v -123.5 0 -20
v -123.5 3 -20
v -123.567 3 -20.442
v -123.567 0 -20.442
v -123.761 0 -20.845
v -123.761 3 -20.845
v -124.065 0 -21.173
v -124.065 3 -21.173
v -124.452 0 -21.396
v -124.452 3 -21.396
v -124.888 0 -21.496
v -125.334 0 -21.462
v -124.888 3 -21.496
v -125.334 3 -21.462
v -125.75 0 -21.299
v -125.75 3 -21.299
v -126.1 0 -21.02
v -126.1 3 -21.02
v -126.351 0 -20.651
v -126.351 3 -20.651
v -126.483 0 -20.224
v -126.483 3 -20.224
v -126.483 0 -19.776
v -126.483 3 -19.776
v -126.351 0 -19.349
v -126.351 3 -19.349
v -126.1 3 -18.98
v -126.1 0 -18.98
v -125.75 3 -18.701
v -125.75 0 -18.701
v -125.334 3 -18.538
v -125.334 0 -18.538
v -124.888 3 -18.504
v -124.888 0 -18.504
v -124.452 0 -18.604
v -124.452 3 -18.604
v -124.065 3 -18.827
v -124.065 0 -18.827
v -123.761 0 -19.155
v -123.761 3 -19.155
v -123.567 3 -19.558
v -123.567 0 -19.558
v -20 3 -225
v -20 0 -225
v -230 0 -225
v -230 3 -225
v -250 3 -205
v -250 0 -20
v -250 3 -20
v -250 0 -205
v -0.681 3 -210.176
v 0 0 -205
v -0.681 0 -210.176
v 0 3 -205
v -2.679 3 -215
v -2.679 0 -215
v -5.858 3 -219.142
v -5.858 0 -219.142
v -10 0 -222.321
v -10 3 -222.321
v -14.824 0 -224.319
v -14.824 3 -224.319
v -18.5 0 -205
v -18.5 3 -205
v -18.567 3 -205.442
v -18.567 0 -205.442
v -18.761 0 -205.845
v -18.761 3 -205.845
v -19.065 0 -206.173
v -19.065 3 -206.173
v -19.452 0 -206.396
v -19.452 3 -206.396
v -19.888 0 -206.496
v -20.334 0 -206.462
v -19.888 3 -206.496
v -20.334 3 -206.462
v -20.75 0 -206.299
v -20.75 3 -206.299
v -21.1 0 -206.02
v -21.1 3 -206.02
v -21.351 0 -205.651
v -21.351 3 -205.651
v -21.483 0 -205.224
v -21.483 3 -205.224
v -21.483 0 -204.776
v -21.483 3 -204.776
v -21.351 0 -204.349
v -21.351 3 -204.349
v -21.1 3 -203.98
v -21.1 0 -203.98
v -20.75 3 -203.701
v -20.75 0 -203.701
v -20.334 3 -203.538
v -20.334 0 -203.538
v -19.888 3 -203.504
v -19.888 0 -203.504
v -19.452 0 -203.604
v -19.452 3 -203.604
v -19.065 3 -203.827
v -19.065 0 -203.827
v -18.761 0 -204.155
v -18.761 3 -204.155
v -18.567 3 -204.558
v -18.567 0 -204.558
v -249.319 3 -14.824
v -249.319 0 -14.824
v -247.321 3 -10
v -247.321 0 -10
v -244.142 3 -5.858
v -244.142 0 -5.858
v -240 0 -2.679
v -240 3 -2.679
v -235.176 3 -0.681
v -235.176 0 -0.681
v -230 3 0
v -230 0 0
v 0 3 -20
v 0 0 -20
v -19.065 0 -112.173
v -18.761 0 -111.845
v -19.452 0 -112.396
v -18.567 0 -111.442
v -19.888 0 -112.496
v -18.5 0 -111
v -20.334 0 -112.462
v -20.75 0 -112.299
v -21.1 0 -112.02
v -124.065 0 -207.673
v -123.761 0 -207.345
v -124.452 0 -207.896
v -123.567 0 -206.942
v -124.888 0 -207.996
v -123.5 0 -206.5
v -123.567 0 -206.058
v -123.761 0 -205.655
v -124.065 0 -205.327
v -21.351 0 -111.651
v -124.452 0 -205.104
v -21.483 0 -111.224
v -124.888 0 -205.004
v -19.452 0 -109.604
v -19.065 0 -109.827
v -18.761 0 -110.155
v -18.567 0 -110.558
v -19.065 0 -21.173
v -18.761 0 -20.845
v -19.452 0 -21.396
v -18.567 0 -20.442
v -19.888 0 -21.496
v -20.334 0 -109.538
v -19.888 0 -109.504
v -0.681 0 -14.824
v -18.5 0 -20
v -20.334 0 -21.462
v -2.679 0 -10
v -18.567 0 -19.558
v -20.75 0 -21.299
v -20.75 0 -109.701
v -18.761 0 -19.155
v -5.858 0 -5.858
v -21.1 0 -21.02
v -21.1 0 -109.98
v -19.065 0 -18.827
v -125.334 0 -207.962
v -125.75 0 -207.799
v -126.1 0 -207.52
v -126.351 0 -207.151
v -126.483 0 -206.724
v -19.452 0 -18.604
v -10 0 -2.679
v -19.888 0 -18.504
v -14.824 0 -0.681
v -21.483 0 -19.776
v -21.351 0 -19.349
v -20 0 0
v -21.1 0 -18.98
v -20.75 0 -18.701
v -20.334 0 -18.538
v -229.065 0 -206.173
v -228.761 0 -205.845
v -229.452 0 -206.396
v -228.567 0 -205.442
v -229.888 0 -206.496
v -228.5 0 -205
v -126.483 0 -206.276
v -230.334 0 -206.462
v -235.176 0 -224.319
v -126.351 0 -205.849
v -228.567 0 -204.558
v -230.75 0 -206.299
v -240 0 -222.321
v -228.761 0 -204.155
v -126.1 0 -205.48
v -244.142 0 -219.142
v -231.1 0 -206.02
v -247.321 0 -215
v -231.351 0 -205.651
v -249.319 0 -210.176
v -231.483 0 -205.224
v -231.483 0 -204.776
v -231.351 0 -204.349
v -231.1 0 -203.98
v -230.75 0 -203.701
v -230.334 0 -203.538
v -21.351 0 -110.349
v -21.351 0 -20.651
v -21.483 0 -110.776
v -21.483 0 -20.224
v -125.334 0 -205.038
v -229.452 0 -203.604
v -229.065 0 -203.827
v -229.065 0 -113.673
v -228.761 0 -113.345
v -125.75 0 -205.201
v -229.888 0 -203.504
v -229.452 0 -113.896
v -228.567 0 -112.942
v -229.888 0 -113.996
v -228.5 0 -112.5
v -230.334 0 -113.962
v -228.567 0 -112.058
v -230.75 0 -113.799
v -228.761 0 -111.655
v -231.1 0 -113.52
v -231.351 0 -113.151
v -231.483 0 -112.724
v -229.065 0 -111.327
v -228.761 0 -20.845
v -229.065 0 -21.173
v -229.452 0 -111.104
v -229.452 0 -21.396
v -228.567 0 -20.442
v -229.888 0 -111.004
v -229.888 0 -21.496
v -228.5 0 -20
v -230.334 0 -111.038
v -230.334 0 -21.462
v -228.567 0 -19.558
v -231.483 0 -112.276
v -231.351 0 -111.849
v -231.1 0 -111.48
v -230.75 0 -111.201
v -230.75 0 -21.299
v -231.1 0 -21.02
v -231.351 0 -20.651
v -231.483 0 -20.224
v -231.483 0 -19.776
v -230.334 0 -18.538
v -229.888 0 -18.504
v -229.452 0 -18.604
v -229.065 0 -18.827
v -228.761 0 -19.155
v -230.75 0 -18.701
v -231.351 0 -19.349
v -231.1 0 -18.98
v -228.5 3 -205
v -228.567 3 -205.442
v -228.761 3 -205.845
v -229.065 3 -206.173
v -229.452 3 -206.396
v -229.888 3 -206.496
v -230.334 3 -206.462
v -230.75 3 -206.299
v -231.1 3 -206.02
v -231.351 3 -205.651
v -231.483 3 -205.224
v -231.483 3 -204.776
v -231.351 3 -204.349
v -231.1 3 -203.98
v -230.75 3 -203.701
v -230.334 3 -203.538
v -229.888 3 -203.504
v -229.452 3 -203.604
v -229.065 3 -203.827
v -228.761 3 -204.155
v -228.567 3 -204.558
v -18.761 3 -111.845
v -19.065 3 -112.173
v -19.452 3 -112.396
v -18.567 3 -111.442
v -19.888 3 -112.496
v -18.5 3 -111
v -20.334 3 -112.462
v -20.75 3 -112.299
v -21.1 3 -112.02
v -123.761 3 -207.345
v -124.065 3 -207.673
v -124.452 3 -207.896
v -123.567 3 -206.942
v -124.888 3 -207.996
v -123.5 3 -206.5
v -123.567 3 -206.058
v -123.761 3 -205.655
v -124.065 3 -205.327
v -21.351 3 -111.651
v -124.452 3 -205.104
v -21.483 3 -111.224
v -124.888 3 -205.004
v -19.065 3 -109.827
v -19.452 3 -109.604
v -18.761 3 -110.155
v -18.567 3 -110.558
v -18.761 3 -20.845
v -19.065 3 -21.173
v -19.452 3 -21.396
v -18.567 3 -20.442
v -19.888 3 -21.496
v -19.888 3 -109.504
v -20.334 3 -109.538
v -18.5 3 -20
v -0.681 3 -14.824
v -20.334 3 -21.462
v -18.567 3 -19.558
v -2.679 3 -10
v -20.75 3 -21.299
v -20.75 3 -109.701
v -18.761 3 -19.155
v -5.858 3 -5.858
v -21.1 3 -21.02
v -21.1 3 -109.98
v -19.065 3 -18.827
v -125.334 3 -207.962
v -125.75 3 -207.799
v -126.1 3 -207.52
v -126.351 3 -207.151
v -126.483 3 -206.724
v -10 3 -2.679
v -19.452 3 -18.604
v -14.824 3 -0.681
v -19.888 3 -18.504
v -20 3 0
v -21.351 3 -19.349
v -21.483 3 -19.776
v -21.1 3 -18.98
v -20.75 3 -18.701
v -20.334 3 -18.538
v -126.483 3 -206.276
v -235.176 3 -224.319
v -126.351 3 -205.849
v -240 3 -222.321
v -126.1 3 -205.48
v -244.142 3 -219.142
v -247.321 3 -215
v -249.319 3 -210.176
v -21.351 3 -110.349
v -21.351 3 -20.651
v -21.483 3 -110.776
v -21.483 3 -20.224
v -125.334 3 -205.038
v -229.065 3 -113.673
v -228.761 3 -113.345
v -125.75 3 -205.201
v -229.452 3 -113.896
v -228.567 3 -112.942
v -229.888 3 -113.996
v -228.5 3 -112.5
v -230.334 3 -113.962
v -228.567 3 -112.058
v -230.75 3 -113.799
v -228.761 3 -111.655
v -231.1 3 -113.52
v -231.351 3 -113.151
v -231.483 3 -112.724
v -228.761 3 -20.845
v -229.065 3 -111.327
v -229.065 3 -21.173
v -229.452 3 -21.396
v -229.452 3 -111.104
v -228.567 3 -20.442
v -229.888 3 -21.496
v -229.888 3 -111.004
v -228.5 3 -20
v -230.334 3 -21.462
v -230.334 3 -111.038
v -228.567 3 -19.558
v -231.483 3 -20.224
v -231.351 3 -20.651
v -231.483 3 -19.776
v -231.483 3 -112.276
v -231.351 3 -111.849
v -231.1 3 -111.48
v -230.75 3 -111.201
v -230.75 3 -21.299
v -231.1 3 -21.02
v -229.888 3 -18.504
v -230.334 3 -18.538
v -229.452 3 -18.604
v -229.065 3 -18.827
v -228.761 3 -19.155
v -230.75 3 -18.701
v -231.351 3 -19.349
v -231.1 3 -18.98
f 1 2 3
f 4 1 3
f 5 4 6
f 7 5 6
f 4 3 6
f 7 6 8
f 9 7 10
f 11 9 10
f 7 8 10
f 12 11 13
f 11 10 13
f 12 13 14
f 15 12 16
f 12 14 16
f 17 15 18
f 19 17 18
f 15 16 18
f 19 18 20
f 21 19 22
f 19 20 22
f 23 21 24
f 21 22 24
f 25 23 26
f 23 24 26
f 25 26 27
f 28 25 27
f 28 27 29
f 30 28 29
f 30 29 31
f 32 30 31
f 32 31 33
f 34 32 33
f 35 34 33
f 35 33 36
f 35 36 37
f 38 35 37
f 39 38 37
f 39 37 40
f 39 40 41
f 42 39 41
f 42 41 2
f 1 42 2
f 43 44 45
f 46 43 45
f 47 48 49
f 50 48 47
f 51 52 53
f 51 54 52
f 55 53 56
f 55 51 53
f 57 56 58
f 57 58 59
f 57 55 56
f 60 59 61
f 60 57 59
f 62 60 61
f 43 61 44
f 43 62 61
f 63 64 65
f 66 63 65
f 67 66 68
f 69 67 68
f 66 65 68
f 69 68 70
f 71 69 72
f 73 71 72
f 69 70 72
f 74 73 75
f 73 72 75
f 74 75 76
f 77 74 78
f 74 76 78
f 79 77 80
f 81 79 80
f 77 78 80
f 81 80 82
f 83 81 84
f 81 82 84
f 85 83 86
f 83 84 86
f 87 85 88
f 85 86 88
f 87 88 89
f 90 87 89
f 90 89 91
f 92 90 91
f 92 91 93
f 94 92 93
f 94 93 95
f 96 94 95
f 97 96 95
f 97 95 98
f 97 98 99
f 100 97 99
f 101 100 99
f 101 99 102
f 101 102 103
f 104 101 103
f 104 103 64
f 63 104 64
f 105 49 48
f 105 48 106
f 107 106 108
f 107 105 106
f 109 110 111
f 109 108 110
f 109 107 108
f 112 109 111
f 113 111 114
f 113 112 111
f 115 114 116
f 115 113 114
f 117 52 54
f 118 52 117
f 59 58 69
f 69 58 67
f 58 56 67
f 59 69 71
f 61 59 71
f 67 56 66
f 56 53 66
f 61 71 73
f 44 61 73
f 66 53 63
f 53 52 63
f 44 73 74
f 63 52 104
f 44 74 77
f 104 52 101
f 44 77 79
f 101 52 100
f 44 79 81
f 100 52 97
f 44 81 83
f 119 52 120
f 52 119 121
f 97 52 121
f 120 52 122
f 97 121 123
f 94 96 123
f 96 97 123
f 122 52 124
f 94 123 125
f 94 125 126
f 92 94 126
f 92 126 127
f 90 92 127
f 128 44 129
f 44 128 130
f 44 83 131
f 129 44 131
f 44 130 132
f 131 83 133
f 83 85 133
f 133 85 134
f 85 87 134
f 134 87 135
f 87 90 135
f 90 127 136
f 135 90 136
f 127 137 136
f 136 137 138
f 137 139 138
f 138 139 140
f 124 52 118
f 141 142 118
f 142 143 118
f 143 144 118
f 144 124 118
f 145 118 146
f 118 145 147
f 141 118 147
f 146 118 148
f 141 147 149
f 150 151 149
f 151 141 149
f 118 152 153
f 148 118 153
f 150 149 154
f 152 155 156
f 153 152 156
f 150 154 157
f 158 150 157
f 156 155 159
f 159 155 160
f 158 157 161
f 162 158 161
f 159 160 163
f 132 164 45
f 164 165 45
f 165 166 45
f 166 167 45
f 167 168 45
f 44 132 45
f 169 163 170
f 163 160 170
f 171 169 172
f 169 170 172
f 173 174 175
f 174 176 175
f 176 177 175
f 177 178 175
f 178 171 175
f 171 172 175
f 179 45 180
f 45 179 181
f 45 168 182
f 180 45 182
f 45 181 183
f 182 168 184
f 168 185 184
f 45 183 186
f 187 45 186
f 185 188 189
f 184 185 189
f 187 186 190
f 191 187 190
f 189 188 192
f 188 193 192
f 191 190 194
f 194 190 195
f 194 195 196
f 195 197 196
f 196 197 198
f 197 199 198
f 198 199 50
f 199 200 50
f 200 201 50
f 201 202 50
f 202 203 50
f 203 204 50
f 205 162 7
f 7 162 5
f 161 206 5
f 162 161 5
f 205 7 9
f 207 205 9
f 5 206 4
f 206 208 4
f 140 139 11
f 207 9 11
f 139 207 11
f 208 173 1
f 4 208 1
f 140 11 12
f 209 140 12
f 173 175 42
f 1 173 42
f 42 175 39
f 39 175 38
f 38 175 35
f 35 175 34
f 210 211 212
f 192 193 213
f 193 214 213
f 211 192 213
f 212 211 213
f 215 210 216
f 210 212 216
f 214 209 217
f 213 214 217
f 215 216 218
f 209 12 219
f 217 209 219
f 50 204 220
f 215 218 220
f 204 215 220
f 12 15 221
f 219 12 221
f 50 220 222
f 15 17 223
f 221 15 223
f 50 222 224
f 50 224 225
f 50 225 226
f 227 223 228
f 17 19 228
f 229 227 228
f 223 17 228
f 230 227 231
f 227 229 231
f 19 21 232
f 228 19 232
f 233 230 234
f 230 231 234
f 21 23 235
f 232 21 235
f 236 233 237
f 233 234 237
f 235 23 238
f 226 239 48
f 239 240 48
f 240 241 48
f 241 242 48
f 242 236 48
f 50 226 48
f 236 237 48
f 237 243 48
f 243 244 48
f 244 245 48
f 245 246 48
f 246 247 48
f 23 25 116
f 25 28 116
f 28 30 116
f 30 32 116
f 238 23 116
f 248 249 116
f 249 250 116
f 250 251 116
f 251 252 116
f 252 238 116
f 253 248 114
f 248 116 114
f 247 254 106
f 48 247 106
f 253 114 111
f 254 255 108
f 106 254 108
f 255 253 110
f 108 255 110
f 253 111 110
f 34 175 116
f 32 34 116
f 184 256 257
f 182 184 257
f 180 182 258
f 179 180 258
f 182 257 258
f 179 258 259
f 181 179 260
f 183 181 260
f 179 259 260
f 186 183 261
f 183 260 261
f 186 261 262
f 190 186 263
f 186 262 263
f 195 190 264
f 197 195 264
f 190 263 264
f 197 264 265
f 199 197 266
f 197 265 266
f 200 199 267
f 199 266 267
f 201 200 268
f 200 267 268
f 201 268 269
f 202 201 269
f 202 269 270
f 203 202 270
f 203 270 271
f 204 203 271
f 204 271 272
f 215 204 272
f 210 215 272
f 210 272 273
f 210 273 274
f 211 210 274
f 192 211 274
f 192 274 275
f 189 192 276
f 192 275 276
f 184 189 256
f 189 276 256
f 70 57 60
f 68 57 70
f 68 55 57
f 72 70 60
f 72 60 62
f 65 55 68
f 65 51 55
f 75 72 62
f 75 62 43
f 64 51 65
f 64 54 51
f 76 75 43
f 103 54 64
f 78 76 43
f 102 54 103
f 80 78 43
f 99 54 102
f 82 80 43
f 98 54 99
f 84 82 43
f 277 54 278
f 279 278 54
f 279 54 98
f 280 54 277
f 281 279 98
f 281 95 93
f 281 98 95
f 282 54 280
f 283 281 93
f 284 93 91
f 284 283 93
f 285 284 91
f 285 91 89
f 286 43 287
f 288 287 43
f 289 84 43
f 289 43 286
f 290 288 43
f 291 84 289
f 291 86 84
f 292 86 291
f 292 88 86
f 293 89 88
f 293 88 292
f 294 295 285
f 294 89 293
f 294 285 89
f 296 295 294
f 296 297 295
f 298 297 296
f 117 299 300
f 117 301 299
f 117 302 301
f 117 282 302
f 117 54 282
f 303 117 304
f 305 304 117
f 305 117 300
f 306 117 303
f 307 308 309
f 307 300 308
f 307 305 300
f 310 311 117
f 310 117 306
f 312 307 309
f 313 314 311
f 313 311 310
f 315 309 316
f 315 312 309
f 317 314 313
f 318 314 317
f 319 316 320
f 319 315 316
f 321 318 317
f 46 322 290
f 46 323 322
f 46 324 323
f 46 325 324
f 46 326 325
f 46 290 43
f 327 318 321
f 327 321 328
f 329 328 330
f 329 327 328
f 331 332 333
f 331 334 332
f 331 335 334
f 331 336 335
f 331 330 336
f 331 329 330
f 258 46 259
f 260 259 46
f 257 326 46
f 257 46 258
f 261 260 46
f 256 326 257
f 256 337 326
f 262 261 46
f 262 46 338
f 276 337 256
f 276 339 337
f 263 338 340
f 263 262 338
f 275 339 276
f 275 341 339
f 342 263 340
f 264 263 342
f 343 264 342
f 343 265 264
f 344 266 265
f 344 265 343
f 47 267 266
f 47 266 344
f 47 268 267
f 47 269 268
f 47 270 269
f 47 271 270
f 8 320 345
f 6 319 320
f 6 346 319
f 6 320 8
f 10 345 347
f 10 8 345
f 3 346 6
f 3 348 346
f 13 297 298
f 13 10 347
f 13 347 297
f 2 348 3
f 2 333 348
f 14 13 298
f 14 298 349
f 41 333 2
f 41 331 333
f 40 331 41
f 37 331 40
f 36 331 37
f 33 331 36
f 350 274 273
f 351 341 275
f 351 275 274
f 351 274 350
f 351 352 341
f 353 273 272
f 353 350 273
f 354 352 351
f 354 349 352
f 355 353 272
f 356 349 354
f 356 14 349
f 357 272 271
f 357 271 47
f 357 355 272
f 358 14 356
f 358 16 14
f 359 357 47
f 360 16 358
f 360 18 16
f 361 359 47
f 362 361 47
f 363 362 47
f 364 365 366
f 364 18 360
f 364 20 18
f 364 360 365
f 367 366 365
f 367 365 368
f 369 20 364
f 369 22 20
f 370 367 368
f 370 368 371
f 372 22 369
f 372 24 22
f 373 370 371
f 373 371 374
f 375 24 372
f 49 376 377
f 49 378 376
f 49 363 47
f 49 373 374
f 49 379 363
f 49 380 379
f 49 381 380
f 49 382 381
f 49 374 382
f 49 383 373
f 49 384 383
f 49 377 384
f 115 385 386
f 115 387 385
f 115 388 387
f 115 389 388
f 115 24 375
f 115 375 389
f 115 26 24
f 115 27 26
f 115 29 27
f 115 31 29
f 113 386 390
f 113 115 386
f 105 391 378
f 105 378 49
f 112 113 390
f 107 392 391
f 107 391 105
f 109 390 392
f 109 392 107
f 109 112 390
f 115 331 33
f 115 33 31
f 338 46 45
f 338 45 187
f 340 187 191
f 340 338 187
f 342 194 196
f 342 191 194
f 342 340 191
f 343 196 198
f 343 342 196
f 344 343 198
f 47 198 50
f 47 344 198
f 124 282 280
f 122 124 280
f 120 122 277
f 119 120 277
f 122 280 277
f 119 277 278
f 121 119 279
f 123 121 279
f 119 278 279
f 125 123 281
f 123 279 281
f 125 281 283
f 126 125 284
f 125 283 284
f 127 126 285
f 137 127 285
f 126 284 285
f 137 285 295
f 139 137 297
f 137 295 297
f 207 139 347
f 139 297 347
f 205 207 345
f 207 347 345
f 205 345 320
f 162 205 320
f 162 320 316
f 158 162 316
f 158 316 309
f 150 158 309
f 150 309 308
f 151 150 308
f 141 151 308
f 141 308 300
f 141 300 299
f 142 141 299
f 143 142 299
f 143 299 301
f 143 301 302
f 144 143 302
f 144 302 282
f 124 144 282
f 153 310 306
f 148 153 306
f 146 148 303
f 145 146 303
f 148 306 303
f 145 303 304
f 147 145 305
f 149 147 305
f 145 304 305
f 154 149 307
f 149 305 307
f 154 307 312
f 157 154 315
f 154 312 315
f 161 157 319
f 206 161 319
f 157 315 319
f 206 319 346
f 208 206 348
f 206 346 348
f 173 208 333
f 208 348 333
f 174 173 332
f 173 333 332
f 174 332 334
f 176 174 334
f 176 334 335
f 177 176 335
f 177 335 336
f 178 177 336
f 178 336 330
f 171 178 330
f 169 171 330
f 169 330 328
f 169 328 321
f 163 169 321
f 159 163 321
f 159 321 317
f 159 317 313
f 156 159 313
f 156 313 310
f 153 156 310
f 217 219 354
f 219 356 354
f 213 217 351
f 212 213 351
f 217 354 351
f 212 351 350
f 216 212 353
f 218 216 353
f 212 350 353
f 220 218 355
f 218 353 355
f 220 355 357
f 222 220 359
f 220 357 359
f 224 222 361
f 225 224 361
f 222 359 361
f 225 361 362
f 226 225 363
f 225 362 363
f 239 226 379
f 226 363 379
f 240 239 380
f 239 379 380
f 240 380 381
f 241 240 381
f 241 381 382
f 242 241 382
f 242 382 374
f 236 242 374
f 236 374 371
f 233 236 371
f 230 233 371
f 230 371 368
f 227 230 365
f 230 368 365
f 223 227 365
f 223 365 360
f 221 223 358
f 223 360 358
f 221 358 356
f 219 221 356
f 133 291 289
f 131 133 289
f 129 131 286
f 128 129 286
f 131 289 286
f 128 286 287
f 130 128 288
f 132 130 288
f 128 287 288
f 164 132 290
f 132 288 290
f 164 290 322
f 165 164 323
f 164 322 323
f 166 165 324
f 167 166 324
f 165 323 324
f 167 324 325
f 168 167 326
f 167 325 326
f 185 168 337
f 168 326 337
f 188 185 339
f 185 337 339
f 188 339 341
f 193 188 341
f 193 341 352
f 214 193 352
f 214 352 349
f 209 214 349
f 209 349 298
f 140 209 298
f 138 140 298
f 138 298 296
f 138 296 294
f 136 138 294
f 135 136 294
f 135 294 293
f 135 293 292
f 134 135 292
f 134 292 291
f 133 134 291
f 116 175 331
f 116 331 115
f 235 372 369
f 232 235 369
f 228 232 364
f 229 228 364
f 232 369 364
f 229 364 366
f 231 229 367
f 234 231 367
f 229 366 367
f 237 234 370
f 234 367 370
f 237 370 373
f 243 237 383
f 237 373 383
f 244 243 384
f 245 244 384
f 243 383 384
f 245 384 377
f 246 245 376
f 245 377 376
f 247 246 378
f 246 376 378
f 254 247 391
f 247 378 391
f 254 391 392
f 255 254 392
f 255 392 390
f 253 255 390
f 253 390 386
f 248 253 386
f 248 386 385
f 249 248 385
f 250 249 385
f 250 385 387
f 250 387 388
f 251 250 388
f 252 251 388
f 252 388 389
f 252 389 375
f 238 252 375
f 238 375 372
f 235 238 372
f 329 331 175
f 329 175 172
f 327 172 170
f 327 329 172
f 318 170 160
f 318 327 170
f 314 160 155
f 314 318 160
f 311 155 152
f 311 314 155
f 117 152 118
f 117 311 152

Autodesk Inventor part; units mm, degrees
ref_plane "YZ Plane" through (0, 0, 0) normal (1, 0, 0) x (0, 1, 0)
ref_plane "XZ Plane" through (0, 0, 0) normal (0, 1, 0) x (-1, 0, 0)
ref_plane "XY Plane" through (0, 0, 0) normal (0, 0, 1) x (1, 0, 0)
sketch "Sketch2" plane through (0, 0, 0) normal (0, 1, 0) x (-1, 0, 0)
  line L0 (0, 0) -> (250, 0)
  line L1 (250, 0) -> (250, -125)
  line L2 (0, -125) -> (0, 0)
  line L3 (125, 0) -> (125, -125) construction
  line L4 (125, -125) -> (200, -125)
  line L5 (200, -125) -> (200, -225)
  line L6 (200, -225) -> (125, -225)
  line L7 (125, -225) -> (125, -125) construction
  line L8 (125, -125) -> (50, -125)
  line L9 (50, -125) -> (50, -225)
  line L10 (50, -225) -> (125, -225)
  line L11 (125, -225) -> (125, -125) construction
  line L12 (200, -125) -> (250, -125)
  line L13 (0, -125) -> (50, -125)
  line L14 (250, 0) -> (0, 0)
  line L15 (0, 0) -> (0, -225)
  line L16 (0, -225) -> (250, -225)
  line L17 (250, -225) -> (250, 0)
  dimension "d36" = 250
  dimension "d37" = 125
  dimension "d38" = 75
  dimension "d39" = 100
  dimension "d40" = 75
  dimension "d41" = 100
extrude "Extrusion3" add sketch "Sketch2" along normal blind 3
fillet "Fillet4" radius 20 2 edges at (-250, 1.5, 0) (0, 1.5, 0)
fillet "Fillet6" radius 20 2 edges at (-250, 1.5, -225) (0, 1.5, -225)
sketch "Sketch4" plane through (0, 3, 0) normal (0, 1, 0) x (1, 0, 0)
  arc A0 (-20, 0) -> (0, 20) centre (-20, 20) ccw projected
  arc A1 (-250, 20) -> (-230, 0) centre (-230, 20) ccw projected
  arc A2 (-230, 225) -> (-250, 205) centre (-230, 205) ccw projected
  arc A3 (0, 205) -> (-20, 225) centre (-20, 205) ccw projected
  line L0 (-20, 20) -> (-20, 205) construction
  line L1 (-230, 20) -> (-230, 205) construction
  circle A4 centre (-230, 20) radius 1.5
  circle A5 centre (-20, 20) radius 1.5
  circle A6 centre (-20, 205) radius 1.5
  circle A7 centre (-230, 205) radius 1.5
  circle A8 centre (-125, 206.5) radius 1.5
  line L2 (-20, 225) -> (-230, 225) construction
  line L3 (-125, 225) -> (-125, 0) construction
  circle A9 centre (-125, 20) radius 1.5
  circle A10 centre (-230, 112.5) radius 1.5
  circle A11 centre (-20, 111) radius 1.5
  point P0 (0, 0)
  dimension "d65" = 3
  dimension "d67" = 3
  dimension "d68" = 3
  dimension "d70" = 3
  dimension "d72" = 3
  dimension "d73" = 3
  dimension "d74" = 3
  dimension "d75" = 3
extrude "Extrusion5" cut sketch "Sketch4" against normal blind 3
properties part number "Chassis Top Plate"
